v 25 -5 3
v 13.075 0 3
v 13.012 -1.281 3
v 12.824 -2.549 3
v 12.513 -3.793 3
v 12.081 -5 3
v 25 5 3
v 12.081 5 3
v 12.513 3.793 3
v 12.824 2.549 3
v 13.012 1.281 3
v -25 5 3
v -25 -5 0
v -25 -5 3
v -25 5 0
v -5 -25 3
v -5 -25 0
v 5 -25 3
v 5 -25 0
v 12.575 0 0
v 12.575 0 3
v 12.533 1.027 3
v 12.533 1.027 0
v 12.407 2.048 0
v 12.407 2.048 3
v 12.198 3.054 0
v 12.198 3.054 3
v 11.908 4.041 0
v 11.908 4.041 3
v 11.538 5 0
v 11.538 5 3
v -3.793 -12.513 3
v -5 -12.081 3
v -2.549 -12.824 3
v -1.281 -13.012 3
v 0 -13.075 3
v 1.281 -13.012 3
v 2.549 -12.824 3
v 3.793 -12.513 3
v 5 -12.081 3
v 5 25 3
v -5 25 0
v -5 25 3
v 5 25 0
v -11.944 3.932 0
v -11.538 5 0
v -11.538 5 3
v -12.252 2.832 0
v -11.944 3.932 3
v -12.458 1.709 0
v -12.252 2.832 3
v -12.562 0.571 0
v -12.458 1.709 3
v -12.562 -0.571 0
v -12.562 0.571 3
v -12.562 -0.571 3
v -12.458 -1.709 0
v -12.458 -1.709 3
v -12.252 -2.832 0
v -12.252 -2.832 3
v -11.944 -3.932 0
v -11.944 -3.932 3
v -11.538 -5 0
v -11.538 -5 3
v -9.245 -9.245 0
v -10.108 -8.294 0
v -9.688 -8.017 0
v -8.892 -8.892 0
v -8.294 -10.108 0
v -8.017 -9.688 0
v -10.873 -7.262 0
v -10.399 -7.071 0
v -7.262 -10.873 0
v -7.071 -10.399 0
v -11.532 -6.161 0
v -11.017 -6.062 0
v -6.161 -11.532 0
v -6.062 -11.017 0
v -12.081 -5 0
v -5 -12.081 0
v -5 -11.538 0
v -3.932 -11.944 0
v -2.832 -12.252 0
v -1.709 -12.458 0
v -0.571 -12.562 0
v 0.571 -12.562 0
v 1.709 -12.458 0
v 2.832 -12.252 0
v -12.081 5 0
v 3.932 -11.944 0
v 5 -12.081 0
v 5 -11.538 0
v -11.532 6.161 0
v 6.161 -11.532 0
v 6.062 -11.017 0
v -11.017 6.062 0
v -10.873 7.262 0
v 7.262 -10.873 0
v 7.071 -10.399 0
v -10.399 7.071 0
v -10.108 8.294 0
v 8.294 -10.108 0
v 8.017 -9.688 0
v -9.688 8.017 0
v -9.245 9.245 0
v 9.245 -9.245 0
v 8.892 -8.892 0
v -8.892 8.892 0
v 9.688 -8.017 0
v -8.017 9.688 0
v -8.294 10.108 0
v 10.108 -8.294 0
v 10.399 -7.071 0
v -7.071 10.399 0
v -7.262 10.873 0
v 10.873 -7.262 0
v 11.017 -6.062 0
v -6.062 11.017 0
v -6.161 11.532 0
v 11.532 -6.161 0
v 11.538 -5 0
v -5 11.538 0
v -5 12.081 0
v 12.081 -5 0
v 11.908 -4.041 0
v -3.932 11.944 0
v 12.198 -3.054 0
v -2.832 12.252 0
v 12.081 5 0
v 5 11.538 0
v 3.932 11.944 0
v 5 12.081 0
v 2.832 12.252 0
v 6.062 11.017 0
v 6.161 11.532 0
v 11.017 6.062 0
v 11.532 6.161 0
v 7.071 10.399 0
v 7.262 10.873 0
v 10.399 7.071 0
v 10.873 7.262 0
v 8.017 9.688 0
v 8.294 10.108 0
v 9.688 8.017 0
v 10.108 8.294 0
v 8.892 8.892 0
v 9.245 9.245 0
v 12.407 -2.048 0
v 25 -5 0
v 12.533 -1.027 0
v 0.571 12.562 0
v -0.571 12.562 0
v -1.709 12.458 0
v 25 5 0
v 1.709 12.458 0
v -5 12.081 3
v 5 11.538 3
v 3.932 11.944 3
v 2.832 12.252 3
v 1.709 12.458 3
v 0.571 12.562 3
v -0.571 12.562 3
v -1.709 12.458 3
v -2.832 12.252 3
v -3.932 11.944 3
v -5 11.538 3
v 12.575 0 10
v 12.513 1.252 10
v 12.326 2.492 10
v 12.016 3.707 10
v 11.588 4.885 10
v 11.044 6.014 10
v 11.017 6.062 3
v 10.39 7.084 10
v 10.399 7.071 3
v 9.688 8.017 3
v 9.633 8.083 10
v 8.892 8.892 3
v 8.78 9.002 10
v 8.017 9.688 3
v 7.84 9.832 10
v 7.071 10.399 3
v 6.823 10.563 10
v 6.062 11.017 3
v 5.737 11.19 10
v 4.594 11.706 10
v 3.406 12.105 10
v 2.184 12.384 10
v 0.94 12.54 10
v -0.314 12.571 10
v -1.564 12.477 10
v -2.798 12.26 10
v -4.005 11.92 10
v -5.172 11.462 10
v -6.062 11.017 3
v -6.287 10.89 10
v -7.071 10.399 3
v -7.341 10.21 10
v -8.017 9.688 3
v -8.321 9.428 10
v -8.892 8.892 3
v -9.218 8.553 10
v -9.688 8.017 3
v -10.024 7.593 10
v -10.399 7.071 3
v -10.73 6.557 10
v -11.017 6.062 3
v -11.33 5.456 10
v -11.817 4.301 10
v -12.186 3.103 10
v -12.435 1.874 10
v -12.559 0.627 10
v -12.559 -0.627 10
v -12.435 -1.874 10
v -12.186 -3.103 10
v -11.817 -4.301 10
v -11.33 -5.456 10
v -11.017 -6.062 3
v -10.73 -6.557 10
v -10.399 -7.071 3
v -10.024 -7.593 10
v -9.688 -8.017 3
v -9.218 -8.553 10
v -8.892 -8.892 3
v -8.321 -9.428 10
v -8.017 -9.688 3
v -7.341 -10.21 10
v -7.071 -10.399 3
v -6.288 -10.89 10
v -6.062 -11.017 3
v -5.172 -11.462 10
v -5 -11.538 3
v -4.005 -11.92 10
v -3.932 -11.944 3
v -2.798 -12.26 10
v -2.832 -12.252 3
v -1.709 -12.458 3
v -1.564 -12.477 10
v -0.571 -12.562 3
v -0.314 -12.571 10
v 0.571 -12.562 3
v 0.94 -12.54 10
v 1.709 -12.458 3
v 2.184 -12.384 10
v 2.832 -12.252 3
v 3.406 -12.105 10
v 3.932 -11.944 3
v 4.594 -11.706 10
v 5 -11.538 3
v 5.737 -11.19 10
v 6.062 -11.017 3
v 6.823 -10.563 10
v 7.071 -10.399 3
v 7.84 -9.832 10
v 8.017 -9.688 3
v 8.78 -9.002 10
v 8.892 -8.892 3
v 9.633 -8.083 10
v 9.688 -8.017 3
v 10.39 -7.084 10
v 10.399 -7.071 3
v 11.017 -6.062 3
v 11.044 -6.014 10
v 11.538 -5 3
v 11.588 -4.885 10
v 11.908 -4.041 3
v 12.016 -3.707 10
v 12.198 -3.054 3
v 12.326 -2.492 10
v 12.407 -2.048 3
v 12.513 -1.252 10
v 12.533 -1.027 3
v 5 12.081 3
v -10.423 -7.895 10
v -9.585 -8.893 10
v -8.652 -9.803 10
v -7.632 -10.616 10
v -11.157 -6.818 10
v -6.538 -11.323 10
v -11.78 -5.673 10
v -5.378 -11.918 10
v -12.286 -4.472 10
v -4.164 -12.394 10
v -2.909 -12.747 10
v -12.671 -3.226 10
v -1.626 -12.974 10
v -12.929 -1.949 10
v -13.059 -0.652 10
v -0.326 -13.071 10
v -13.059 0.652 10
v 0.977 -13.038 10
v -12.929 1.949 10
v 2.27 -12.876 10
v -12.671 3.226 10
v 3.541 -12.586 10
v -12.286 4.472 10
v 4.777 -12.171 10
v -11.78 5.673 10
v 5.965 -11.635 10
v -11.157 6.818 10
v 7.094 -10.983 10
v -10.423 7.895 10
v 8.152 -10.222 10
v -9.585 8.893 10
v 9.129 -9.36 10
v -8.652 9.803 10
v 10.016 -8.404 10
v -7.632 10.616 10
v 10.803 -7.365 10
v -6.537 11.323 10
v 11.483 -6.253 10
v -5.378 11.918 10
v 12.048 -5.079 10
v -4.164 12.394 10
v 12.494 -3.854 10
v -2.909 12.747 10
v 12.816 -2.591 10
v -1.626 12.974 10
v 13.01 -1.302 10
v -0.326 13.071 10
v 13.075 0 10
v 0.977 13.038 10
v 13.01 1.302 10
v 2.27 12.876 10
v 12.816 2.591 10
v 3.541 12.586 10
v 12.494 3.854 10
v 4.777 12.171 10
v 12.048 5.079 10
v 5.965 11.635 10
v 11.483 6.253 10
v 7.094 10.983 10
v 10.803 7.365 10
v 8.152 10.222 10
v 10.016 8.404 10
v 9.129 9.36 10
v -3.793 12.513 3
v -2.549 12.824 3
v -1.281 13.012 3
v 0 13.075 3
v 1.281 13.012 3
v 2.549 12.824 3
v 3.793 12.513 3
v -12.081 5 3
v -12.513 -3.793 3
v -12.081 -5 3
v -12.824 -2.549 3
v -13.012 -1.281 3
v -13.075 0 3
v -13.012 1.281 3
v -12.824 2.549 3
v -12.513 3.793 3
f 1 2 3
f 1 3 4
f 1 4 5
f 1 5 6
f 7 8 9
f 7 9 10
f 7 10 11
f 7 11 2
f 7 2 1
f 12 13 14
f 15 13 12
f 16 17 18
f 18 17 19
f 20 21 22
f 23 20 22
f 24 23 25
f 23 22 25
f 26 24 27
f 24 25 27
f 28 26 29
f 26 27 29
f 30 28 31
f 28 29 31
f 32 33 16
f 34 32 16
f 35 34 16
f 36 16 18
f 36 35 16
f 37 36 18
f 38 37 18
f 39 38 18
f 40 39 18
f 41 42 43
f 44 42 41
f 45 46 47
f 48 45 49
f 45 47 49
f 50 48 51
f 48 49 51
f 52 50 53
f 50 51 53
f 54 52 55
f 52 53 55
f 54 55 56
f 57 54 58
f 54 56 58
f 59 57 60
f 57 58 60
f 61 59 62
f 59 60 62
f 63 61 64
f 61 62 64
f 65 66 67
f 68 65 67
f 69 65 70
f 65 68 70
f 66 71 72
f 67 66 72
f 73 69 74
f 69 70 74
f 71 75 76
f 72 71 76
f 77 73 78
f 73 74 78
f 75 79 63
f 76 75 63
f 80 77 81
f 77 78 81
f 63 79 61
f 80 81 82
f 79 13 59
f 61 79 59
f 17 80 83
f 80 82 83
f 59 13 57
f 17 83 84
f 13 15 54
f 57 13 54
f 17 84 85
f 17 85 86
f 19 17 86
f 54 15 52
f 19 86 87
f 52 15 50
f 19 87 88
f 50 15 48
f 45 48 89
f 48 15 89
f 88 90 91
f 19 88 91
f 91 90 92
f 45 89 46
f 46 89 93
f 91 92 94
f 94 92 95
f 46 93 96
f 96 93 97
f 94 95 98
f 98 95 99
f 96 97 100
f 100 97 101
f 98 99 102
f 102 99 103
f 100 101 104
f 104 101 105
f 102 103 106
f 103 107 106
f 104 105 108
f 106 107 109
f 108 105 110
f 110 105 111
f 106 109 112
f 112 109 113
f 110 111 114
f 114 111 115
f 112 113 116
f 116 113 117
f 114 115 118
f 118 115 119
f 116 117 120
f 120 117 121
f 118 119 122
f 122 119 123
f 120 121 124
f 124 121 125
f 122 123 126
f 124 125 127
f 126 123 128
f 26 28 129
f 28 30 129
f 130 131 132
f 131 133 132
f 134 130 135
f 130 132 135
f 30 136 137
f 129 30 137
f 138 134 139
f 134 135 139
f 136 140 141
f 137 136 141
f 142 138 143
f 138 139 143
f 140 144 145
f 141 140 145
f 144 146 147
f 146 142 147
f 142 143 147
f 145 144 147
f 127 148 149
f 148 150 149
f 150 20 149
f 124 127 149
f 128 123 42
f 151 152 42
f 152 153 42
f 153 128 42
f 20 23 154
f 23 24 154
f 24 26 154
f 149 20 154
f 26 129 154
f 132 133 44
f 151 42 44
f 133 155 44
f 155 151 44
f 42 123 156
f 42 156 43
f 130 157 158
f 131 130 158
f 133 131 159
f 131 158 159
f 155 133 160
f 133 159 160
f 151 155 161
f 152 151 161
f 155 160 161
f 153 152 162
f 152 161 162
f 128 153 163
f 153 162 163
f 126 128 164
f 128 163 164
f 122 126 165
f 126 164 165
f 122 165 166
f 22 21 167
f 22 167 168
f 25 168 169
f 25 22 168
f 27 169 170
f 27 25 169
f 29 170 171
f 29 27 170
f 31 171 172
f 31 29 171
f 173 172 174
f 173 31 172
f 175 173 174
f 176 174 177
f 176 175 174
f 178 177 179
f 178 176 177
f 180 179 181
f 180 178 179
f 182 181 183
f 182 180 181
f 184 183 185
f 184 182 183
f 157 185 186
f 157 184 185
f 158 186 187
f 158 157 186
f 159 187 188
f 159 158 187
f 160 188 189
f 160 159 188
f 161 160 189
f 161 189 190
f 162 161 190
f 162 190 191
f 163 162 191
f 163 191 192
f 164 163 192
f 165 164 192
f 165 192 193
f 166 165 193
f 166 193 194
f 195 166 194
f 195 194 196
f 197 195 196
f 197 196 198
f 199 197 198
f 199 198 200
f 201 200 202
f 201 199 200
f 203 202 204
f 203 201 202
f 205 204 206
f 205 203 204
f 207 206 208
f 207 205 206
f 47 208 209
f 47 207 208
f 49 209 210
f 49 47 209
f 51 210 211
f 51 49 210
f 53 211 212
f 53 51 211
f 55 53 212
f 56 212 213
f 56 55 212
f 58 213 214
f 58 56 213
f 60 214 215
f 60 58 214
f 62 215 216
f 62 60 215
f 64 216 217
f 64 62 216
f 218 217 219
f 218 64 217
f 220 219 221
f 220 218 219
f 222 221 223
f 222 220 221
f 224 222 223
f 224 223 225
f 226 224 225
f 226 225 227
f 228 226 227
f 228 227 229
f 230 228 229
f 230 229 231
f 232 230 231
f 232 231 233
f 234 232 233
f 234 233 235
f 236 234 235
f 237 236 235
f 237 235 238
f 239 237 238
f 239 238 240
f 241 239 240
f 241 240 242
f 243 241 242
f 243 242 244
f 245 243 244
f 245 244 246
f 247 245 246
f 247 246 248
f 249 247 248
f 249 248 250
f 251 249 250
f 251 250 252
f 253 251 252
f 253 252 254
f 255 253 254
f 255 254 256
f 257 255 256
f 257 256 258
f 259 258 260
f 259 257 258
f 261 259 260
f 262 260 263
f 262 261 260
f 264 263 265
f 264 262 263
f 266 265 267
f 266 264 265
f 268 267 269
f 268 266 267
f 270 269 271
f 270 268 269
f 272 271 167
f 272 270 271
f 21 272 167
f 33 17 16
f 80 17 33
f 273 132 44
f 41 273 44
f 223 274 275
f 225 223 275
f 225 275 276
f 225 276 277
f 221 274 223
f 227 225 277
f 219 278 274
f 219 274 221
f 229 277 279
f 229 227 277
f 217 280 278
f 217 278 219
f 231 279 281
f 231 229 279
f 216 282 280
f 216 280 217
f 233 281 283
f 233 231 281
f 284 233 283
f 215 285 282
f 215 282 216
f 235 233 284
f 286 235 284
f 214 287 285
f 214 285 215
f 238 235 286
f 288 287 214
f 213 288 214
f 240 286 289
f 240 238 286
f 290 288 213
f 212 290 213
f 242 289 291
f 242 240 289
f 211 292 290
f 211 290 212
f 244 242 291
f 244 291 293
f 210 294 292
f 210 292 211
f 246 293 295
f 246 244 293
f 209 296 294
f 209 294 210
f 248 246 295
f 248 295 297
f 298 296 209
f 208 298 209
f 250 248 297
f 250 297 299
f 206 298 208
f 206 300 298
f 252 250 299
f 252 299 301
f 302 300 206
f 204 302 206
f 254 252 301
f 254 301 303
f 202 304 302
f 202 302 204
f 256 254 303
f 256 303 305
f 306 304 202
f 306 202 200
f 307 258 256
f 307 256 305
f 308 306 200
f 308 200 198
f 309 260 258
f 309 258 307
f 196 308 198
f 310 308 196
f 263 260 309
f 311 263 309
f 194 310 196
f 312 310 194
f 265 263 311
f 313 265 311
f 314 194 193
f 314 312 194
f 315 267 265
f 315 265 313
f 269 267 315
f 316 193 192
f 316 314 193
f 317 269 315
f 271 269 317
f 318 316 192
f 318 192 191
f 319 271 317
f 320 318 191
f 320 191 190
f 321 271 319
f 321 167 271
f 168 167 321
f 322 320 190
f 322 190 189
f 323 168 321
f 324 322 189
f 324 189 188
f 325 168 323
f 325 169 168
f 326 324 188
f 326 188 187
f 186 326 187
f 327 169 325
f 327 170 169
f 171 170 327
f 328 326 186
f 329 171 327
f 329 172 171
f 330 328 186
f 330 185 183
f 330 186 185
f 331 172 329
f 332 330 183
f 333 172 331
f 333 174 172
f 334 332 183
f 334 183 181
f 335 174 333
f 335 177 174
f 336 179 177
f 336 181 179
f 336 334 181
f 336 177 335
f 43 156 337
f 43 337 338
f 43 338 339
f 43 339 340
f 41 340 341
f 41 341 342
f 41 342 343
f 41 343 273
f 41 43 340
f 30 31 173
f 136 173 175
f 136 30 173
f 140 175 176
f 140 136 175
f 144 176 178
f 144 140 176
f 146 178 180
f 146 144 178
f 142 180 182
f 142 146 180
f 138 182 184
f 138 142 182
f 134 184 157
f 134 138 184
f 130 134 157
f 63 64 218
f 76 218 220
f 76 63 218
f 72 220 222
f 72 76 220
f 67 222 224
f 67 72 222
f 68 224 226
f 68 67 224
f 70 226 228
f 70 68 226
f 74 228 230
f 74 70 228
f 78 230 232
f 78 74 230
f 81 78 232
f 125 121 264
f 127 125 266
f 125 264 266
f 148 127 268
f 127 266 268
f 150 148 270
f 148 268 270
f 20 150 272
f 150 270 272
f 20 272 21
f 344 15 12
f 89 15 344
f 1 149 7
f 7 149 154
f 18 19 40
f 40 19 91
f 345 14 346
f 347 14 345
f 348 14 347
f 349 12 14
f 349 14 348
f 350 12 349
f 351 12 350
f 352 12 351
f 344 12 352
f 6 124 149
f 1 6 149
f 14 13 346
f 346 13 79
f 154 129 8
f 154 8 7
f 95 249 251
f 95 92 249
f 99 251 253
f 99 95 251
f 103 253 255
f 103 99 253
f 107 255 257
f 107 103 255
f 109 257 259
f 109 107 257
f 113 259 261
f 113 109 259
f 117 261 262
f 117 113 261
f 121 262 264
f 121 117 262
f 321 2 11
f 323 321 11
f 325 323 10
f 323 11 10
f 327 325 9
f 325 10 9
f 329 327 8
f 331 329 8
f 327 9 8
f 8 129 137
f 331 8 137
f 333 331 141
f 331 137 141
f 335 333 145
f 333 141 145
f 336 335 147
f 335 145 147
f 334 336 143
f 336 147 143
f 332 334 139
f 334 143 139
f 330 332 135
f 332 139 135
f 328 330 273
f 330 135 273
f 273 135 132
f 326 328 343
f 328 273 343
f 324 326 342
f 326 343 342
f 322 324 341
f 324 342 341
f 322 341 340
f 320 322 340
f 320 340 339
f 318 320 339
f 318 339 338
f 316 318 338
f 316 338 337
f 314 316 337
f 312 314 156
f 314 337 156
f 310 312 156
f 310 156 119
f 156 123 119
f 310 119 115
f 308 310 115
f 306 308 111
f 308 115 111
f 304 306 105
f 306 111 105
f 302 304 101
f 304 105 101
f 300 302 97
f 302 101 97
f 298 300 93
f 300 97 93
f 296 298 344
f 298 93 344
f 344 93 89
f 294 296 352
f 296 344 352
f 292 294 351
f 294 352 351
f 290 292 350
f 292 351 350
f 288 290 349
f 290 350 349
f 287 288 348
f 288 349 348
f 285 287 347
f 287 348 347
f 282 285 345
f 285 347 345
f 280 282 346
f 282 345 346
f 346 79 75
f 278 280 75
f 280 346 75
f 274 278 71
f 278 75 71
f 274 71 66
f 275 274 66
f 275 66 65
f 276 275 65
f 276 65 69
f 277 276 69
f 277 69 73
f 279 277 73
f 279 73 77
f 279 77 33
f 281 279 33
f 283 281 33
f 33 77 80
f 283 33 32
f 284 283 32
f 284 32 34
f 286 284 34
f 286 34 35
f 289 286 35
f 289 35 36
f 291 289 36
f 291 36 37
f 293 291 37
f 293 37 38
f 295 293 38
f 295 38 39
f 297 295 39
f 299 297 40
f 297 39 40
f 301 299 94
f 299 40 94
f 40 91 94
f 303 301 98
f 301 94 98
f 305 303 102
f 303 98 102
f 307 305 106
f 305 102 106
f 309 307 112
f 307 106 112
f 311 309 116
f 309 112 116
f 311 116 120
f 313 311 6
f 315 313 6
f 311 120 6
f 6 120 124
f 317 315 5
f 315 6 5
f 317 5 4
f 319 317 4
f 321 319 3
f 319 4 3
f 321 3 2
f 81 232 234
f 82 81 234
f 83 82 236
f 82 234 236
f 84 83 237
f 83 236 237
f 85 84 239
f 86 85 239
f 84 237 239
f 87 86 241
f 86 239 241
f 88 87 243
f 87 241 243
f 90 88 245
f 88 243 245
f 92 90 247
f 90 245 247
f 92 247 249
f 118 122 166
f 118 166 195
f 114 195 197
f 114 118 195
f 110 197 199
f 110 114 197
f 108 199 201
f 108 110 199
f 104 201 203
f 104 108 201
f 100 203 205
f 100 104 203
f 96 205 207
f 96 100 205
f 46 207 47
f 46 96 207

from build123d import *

# Parameters (mm, degrees)
F0_R     = 13.075
F0_R_2   = 12.575
F1_DEPTH = 10
F2_W     = 20
F2_H     = 10
F2_W_2   = 10
F2_H_2   = 20
F3_DEPTH = 3
F4_R     = 12.575
F5_DEPTH = 25


with BuildPart() as f1:
    # F0 (on Top) → F1 (new body)
    with BuildSketch(Plane.XY):
        Circle(F0_R)
        Circle(F0_R_2, mode=Mode.SUBTRACT)
    extrude(amount=F1_DEPTH)

    # F2 (on Top) → F3 (join)
    with BuildSketch(Plane.XY):
        with Locations((15, 0)):
            Rectangle(F2_W, F2_H)
        with Locations((0, -15)):
            Rectangle(F2_W_2, F2_H_2)
        with Locations((-15, 0)):
            Rectangle(F2_W, F2_H)
        with Locations((0, 15)):
            Rectangle(F2_W_2, F2_H_2)
    extrude(amount=F3_DEPTH)

    # F4 (on face) → F5 (cut)
    with BuildSketch(Plane.XY.offset(3)):
        Circle(F4_R)
    extrude(amount=-F5_DEPTH, mode=Mode.SUBTRACT)


solid = f1.part
